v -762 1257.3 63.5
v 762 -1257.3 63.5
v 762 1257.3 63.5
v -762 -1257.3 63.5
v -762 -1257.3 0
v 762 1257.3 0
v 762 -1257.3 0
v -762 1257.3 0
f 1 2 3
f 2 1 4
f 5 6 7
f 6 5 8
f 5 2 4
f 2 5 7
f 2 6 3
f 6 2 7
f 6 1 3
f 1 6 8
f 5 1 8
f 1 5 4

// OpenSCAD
// file: ../lib/convert.scad
function inches(in) = in * 25.4;
function feet(ft) = inches(ft * 12);
// main file
use <../lib/convert.scad>

floor_thickness = inches(2.5);
floor_width = feet(5);
floor_length = feet(8) + inches(3);

module trailer_floor() {
  translate([0, 0, floor_thickness / 2])
    color("#f2ba52")
      cube([floor_width, floor_length, floor_thickness], center = true);
}

trailer_floor();
